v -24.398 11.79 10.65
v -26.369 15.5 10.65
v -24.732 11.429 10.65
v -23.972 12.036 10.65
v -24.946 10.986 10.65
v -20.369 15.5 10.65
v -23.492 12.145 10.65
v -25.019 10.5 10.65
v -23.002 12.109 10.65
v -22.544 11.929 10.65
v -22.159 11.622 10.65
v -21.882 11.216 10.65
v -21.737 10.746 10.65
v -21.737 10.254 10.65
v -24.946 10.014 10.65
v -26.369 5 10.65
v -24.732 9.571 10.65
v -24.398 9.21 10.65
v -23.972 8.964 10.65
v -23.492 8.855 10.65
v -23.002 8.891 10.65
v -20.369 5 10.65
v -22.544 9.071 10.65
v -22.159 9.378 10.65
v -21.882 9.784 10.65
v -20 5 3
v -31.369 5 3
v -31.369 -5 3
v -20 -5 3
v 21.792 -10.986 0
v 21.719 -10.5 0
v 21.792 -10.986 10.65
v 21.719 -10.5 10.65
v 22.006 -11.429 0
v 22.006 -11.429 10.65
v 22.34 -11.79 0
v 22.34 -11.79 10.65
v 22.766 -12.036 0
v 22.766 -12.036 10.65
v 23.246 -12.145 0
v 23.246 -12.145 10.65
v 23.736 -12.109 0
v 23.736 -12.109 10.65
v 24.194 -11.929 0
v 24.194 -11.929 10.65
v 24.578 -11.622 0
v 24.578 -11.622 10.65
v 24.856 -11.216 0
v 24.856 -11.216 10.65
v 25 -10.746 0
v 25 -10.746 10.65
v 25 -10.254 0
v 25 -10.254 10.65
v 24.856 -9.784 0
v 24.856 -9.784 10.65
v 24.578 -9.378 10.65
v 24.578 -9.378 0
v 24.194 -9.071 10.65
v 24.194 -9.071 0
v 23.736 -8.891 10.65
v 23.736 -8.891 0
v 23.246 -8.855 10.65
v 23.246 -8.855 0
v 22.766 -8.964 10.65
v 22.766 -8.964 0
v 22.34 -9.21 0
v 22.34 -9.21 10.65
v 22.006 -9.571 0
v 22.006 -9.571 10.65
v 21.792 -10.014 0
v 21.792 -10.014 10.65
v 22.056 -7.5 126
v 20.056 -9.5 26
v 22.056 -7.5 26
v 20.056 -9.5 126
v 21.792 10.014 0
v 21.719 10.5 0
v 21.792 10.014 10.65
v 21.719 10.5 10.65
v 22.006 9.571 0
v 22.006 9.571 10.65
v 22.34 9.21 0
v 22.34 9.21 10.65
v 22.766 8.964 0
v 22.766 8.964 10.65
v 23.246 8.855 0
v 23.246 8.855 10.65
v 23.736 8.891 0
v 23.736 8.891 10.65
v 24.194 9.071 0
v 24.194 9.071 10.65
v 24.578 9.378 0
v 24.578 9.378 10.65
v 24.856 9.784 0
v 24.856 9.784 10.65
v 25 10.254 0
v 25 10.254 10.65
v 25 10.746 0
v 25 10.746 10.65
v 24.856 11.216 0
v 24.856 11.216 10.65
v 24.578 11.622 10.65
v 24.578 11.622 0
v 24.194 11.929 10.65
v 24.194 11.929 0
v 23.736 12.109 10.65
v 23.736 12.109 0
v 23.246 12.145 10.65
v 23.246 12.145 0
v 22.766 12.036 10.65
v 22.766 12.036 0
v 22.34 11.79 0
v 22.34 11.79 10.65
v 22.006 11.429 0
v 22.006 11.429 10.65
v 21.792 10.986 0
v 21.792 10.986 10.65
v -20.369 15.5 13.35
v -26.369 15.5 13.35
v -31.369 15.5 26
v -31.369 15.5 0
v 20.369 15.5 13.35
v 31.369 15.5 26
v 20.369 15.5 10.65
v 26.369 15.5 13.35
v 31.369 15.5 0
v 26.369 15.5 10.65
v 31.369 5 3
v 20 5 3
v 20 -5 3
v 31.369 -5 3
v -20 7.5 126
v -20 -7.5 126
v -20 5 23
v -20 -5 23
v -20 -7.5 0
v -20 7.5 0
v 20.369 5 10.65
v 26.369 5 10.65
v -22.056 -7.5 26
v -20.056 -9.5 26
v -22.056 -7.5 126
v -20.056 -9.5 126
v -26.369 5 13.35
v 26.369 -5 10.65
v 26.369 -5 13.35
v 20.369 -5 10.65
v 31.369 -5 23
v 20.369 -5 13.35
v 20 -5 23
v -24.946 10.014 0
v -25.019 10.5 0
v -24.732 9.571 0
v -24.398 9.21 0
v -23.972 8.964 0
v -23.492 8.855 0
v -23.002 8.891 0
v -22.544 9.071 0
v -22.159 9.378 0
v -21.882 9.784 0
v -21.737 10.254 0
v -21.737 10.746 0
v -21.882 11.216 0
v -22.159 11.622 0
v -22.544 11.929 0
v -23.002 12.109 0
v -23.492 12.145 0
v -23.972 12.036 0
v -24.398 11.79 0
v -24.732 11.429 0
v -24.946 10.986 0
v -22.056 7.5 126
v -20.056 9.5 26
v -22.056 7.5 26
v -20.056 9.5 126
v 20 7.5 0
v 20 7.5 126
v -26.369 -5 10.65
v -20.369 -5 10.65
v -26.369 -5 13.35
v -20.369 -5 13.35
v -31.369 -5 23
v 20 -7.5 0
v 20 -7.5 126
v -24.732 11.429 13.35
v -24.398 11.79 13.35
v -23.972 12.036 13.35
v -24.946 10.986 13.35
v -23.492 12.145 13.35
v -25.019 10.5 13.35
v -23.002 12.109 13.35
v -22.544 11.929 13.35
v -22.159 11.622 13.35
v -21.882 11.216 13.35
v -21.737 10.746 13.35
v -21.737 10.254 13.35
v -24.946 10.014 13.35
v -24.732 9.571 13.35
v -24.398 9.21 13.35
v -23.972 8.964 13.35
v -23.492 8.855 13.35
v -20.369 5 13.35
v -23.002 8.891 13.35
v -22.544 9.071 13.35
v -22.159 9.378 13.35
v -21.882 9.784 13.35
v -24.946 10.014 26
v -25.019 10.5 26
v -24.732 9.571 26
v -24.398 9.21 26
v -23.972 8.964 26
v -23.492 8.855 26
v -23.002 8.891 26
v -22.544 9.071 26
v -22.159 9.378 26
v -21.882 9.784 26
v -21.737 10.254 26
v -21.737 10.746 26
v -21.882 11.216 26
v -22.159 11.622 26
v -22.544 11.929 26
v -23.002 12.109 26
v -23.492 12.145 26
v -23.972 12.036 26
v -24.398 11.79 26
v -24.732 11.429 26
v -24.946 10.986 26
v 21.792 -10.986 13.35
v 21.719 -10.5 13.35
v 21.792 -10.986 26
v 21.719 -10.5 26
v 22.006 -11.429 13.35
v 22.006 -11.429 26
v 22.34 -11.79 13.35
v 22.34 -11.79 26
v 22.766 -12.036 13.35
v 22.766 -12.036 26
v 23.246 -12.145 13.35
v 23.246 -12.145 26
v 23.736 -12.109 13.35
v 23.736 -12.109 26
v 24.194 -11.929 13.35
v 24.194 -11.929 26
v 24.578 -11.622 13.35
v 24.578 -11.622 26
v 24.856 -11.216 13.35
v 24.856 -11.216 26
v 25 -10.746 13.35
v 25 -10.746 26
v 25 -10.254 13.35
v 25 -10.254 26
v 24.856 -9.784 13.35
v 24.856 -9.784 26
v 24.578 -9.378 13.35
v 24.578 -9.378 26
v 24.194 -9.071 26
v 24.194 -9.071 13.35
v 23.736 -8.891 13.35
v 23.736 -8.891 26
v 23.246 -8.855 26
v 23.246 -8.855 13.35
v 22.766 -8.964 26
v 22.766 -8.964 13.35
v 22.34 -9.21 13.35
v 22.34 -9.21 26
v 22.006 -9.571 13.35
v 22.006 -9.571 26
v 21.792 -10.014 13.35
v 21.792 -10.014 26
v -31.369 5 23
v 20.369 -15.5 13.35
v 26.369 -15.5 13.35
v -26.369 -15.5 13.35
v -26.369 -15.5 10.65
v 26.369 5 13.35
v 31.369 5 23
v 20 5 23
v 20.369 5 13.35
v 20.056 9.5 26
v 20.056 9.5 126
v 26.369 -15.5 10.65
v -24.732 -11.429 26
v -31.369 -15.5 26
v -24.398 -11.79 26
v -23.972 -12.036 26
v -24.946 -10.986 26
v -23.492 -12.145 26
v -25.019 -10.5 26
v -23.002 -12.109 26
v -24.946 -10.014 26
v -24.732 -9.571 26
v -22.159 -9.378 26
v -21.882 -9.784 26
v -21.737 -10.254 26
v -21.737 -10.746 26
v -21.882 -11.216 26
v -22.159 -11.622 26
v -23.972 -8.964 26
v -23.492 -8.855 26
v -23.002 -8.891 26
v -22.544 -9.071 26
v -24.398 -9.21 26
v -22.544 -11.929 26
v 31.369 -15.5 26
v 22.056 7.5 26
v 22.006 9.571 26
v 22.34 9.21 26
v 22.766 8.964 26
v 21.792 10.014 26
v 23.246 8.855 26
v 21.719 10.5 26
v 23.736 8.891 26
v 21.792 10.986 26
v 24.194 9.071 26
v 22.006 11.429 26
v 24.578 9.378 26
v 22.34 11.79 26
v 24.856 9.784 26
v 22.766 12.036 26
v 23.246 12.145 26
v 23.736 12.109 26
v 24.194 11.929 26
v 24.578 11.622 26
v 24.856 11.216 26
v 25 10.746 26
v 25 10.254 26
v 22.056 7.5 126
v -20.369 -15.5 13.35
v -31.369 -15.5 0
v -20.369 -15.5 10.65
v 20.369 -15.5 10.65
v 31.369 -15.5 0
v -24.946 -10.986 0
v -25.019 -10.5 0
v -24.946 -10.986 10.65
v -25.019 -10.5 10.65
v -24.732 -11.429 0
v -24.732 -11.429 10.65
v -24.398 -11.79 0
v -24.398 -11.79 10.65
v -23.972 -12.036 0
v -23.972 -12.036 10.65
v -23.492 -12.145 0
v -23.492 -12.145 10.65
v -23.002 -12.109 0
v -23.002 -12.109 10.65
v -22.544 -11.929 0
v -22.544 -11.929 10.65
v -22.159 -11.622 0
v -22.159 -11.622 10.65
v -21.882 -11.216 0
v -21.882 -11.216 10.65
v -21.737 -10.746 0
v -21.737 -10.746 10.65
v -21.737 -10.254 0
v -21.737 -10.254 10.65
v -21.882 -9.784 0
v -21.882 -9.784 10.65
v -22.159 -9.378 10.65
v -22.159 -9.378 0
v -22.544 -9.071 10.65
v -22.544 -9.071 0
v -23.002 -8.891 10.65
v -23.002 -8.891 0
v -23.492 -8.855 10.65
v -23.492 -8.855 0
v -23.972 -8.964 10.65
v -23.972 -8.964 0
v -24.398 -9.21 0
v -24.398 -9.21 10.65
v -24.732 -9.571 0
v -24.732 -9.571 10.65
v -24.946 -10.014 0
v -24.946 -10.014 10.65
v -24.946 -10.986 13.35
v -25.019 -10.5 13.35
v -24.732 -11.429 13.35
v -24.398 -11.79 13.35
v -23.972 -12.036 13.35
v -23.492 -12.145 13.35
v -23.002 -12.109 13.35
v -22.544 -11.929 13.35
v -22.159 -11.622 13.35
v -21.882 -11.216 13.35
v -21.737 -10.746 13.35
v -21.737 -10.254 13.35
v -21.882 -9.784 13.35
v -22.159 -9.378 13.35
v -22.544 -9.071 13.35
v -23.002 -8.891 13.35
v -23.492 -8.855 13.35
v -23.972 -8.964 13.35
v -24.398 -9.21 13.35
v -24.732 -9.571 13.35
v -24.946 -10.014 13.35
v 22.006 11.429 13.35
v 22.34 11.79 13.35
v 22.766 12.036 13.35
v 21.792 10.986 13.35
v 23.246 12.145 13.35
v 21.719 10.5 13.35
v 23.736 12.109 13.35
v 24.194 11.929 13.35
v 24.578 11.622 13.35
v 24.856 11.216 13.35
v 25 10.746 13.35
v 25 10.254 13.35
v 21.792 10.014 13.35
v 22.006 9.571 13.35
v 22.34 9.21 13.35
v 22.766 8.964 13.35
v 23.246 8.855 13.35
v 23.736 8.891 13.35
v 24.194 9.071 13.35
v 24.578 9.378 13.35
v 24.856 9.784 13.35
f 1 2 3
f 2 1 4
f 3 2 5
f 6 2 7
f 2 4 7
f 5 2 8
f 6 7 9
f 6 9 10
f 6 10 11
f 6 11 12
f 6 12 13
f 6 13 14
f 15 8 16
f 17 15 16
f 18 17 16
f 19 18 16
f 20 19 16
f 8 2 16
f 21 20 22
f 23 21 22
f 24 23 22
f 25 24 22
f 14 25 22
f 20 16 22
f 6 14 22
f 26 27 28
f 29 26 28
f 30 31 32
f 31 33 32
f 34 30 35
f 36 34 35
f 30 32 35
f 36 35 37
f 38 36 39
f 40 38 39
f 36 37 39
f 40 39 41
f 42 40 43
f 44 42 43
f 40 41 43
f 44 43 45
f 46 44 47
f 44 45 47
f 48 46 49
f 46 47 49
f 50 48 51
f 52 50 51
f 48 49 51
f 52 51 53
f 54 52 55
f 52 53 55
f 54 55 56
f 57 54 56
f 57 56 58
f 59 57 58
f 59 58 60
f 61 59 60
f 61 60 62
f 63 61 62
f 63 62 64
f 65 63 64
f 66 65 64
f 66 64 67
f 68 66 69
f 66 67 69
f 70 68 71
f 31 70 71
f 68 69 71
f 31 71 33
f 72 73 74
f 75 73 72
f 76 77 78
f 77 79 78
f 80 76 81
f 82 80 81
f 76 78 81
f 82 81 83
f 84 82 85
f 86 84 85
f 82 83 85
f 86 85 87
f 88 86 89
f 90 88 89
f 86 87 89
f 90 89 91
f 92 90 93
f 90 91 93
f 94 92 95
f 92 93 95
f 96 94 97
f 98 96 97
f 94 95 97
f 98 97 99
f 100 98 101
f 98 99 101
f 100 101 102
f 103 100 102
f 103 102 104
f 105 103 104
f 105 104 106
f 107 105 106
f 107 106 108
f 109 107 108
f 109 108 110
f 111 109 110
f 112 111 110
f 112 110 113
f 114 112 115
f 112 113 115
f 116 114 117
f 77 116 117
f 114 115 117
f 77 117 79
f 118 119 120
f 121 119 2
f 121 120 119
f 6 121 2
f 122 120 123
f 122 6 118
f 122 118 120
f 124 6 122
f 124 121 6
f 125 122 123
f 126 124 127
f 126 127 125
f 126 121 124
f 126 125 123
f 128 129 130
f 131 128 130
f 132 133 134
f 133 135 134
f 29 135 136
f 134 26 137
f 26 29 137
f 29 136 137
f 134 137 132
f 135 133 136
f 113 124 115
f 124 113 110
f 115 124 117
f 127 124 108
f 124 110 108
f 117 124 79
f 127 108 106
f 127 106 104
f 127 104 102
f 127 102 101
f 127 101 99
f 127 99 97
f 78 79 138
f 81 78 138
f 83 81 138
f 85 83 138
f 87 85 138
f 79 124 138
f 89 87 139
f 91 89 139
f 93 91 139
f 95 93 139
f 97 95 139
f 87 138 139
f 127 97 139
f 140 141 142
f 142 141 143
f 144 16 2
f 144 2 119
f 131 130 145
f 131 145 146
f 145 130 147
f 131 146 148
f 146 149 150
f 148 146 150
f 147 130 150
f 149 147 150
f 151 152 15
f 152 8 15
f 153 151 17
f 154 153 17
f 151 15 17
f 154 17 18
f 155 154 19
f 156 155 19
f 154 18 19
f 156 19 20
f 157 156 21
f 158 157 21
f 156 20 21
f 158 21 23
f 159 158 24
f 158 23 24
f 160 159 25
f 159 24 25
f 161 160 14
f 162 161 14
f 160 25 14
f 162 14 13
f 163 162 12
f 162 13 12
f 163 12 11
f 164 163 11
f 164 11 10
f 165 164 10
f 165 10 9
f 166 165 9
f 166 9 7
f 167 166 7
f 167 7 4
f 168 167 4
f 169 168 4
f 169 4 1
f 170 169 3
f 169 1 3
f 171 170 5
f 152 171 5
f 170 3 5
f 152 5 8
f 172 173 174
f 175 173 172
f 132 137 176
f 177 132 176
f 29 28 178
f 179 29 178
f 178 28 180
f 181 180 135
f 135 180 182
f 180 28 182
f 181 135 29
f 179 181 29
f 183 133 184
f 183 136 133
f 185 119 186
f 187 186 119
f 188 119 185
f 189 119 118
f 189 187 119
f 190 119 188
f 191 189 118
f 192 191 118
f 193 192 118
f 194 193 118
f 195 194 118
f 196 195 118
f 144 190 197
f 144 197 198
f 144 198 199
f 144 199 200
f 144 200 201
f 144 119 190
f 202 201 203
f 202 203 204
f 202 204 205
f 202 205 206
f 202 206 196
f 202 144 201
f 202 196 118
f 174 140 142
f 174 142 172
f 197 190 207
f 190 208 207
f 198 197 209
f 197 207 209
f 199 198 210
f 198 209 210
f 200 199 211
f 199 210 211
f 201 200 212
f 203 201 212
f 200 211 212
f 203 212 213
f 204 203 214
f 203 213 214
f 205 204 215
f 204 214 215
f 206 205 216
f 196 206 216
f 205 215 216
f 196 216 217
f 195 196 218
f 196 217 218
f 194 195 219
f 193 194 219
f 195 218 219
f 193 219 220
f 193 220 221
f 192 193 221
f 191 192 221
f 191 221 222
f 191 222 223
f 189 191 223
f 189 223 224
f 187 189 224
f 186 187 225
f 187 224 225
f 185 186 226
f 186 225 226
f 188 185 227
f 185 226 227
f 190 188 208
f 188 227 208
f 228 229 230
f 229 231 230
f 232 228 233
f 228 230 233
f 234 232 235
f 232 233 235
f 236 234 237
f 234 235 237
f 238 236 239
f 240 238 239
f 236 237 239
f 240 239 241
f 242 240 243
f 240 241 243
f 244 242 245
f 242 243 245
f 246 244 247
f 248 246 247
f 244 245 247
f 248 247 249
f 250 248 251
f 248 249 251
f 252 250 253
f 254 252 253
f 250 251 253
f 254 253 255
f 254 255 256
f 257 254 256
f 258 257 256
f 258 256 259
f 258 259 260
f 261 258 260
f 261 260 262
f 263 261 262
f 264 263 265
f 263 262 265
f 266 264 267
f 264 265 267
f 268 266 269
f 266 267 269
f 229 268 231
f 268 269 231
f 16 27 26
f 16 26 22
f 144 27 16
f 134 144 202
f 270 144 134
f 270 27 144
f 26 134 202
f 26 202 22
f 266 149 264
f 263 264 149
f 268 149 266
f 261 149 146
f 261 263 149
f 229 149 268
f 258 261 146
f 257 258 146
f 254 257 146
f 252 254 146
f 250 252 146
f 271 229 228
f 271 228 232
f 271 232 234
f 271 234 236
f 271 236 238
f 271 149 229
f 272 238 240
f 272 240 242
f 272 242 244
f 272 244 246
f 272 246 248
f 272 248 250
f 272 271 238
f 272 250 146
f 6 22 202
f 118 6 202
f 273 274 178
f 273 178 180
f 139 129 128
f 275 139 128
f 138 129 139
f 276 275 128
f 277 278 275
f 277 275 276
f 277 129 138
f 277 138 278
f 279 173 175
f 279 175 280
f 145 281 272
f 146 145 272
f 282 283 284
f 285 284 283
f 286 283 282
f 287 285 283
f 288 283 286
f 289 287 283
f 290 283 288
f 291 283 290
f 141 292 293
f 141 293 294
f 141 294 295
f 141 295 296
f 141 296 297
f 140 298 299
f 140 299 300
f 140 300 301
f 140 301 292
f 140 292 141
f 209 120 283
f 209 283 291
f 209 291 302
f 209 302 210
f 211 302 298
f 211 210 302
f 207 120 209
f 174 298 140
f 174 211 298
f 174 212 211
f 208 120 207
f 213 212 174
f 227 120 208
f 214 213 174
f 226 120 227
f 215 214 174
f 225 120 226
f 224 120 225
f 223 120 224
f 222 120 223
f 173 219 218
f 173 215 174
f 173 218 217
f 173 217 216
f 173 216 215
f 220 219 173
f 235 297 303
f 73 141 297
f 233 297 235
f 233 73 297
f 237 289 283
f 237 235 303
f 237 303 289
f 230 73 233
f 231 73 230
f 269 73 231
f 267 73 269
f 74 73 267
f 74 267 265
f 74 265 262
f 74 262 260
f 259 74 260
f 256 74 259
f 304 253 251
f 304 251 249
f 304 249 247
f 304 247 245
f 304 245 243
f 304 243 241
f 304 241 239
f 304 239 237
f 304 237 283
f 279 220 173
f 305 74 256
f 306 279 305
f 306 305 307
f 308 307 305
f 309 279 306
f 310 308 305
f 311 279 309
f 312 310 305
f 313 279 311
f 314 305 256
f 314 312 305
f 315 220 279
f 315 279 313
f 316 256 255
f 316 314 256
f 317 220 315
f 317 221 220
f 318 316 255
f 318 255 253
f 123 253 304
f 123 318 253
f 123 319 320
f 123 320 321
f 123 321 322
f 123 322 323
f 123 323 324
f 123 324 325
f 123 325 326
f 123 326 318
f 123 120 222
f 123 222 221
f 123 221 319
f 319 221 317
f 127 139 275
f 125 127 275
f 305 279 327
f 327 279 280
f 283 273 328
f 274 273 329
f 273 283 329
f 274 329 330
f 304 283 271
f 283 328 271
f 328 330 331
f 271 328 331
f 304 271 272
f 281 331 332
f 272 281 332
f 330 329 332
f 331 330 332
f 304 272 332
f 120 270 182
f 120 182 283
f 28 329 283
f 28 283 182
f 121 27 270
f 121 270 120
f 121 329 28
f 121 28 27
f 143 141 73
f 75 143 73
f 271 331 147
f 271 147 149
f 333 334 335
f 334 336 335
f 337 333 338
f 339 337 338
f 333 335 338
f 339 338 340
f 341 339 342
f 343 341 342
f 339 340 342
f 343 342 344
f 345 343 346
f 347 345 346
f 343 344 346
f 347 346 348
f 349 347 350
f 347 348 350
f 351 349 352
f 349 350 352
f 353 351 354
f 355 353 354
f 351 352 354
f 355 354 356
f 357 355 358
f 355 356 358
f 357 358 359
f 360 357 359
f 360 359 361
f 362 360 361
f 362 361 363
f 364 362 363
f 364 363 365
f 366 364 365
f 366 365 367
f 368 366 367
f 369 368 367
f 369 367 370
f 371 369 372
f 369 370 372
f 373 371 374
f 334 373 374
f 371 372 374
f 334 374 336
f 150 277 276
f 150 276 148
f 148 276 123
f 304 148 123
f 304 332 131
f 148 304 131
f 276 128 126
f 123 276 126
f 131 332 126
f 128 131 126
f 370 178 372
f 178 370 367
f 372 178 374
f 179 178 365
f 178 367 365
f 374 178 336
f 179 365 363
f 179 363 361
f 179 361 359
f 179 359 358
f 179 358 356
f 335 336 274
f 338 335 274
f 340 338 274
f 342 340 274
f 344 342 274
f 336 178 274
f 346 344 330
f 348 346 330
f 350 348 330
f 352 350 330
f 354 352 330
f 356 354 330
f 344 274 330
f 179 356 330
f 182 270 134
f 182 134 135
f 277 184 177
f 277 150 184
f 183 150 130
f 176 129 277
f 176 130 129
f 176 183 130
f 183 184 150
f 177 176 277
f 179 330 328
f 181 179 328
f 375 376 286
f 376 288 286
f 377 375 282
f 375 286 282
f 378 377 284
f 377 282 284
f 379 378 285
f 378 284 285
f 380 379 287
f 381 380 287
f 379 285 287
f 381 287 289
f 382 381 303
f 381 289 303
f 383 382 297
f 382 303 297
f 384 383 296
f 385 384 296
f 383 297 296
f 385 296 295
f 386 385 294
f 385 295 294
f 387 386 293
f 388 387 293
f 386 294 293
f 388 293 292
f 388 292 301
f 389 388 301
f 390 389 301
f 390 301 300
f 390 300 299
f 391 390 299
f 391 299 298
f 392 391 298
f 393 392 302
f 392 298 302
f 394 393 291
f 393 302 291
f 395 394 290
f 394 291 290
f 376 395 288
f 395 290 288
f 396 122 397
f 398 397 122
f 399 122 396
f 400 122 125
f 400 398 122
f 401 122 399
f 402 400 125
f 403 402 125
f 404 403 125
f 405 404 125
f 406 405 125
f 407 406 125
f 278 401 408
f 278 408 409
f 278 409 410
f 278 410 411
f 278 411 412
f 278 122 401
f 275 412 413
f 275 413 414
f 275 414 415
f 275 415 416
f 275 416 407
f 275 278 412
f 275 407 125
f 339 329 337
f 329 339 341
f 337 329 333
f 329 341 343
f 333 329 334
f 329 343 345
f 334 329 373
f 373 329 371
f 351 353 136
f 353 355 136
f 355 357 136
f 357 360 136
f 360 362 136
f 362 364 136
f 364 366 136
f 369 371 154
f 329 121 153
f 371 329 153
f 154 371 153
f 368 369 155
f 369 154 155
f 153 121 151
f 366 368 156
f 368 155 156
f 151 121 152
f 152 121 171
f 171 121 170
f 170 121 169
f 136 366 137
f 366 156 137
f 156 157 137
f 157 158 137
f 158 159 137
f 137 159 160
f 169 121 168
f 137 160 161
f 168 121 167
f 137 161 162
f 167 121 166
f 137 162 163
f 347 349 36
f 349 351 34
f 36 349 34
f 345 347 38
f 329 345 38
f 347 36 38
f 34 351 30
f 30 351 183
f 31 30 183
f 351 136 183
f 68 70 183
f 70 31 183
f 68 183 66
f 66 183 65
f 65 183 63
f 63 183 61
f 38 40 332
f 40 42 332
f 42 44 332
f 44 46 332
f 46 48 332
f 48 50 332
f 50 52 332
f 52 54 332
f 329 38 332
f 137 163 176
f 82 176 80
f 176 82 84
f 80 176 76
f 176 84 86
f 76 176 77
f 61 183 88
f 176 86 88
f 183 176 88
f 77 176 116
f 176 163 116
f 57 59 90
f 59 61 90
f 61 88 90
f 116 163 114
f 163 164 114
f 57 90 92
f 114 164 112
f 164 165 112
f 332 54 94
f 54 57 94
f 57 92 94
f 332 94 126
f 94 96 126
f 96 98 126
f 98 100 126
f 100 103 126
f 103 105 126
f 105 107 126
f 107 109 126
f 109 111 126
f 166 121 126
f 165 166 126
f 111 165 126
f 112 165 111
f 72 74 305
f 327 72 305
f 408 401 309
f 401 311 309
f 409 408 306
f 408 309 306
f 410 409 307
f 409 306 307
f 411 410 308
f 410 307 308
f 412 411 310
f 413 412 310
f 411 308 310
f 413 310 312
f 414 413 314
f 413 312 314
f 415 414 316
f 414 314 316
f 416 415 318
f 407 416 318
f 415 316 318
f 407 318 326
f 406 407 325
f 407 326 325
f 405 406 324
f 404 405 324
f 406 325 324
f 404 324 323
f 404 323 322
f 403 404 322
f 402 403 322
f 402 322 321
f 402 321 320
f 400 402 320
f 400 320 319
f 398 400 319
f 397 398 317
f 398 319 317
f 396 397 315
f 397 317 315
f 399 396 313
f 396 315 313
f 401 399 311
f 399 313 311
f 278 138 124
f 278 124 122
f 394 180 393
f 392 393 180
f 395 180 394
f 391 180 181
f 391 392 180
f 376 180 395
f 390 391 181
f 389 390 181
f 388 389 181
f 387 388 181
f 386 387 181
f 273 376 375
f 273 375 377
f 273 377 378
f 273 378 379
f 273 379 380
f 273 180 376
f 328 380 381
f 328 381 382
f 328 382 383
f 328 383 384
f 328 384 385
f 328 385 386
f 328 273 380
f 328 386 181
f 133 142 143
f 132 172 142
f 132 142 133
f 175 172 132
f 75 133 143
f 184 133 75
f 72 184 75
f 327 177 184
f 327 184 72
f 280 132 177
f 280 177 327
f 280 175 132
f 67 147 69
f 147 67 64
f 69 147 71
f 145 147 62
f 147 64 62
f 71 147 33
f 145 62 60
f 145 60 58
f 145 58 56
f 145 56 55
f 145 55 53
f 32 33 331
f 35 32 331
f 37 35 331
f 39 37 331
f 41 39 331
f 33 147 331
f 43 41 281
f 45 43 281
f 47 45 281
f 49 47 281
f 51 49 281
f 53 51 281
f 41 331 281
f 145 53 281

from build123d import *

# Parameters (mm, degrees)
F0_W     = 62.7378050089
F0_H     = 31
F0_W_2   = 40
F0_H_2   = 15
F1_DEPTH = 26
F2_W     = 10
F2_H     = 20
F3_DEPTH = 62.7388050089
F4_D     = 3.3
F5_W     = 44.1129240592
F5_H     = 19
F5_W_2   = 40
F5_H_2   = 15
F6_DEPTH = 100
F7_SIZE  = 2
F8_W     = 6
F8_H     = 2.7
F9_DEPTH = 31.001


with BuildPart() as f1:
    # F0 (on Top) → F1 (new body)
    with BuildSketch(Plane.XY):
        Rectangle(F0_W, F0_H)
        Rectangle(F0_W_2, F0_H_2, mode=Mode.SUBTRACT)
    extrude(amount=F1_DEPTH)

    # F2 (on face) → F3 (cut, through all)
    with BuildSketch(Plane(origin=(-31.3689025044, 0, 0), x_dir=(0, -1, 0), z_dir=(-1, 0, 0))):
        with Locations((0, 13)):
            Rectangle(F2_W, F2_H)
    extrude(amount=-F3_DEPTH, mode=Mode.SUBTRACT)

    # F4 (through all)
    with Locations(Plane(origin=(0, 0, 0), x_dir=(1, 0, 0), z_dir=(0, 0, -1))):
        with Locations((-23.3689025044, -10.5), (-23.3689025044, 10.5), (23.3689025044, 10.5), (23.3689025044, -10.5)):
            Hole(F4_D / 2)

    # F5 (on face) → F6 (join)
    with BuildSketch(Plane.XY.offset(26)):
        Rectangle(F5_W, F5_H)
        Rectangle(F5_W_2, F5_H_2, mode=Mode.SUBTRACT)
    extrude(amount=F6_DEPTH)

    # F7
    f7_edges = [f1.edges().sort_by_distance(p)[0] for p in [
        (22.056462, 9.5, 76),
        (-22.056462, 9.5, 76),
        (22.056462, -9.5, 76),
        (-22.056462, -9.5, 76),
    ]]
    chamfer(f7_edges, length=F7_SIZE)

    # F8 (on face) → F9 (cut, through all)
    with BuildSketch(Plane.XZ.offset(15.5)):
        with Locations((-23.3689025044, 12)):
            Rectangle(F8_W, F8_H)
        with Locations((23.3689025044, 12)):
            Rectangle(F8_W, F8_H)
    extrude(amount=-F9_DEPTH, mode=Mode.SUBTRACT)


solid = f1.part
